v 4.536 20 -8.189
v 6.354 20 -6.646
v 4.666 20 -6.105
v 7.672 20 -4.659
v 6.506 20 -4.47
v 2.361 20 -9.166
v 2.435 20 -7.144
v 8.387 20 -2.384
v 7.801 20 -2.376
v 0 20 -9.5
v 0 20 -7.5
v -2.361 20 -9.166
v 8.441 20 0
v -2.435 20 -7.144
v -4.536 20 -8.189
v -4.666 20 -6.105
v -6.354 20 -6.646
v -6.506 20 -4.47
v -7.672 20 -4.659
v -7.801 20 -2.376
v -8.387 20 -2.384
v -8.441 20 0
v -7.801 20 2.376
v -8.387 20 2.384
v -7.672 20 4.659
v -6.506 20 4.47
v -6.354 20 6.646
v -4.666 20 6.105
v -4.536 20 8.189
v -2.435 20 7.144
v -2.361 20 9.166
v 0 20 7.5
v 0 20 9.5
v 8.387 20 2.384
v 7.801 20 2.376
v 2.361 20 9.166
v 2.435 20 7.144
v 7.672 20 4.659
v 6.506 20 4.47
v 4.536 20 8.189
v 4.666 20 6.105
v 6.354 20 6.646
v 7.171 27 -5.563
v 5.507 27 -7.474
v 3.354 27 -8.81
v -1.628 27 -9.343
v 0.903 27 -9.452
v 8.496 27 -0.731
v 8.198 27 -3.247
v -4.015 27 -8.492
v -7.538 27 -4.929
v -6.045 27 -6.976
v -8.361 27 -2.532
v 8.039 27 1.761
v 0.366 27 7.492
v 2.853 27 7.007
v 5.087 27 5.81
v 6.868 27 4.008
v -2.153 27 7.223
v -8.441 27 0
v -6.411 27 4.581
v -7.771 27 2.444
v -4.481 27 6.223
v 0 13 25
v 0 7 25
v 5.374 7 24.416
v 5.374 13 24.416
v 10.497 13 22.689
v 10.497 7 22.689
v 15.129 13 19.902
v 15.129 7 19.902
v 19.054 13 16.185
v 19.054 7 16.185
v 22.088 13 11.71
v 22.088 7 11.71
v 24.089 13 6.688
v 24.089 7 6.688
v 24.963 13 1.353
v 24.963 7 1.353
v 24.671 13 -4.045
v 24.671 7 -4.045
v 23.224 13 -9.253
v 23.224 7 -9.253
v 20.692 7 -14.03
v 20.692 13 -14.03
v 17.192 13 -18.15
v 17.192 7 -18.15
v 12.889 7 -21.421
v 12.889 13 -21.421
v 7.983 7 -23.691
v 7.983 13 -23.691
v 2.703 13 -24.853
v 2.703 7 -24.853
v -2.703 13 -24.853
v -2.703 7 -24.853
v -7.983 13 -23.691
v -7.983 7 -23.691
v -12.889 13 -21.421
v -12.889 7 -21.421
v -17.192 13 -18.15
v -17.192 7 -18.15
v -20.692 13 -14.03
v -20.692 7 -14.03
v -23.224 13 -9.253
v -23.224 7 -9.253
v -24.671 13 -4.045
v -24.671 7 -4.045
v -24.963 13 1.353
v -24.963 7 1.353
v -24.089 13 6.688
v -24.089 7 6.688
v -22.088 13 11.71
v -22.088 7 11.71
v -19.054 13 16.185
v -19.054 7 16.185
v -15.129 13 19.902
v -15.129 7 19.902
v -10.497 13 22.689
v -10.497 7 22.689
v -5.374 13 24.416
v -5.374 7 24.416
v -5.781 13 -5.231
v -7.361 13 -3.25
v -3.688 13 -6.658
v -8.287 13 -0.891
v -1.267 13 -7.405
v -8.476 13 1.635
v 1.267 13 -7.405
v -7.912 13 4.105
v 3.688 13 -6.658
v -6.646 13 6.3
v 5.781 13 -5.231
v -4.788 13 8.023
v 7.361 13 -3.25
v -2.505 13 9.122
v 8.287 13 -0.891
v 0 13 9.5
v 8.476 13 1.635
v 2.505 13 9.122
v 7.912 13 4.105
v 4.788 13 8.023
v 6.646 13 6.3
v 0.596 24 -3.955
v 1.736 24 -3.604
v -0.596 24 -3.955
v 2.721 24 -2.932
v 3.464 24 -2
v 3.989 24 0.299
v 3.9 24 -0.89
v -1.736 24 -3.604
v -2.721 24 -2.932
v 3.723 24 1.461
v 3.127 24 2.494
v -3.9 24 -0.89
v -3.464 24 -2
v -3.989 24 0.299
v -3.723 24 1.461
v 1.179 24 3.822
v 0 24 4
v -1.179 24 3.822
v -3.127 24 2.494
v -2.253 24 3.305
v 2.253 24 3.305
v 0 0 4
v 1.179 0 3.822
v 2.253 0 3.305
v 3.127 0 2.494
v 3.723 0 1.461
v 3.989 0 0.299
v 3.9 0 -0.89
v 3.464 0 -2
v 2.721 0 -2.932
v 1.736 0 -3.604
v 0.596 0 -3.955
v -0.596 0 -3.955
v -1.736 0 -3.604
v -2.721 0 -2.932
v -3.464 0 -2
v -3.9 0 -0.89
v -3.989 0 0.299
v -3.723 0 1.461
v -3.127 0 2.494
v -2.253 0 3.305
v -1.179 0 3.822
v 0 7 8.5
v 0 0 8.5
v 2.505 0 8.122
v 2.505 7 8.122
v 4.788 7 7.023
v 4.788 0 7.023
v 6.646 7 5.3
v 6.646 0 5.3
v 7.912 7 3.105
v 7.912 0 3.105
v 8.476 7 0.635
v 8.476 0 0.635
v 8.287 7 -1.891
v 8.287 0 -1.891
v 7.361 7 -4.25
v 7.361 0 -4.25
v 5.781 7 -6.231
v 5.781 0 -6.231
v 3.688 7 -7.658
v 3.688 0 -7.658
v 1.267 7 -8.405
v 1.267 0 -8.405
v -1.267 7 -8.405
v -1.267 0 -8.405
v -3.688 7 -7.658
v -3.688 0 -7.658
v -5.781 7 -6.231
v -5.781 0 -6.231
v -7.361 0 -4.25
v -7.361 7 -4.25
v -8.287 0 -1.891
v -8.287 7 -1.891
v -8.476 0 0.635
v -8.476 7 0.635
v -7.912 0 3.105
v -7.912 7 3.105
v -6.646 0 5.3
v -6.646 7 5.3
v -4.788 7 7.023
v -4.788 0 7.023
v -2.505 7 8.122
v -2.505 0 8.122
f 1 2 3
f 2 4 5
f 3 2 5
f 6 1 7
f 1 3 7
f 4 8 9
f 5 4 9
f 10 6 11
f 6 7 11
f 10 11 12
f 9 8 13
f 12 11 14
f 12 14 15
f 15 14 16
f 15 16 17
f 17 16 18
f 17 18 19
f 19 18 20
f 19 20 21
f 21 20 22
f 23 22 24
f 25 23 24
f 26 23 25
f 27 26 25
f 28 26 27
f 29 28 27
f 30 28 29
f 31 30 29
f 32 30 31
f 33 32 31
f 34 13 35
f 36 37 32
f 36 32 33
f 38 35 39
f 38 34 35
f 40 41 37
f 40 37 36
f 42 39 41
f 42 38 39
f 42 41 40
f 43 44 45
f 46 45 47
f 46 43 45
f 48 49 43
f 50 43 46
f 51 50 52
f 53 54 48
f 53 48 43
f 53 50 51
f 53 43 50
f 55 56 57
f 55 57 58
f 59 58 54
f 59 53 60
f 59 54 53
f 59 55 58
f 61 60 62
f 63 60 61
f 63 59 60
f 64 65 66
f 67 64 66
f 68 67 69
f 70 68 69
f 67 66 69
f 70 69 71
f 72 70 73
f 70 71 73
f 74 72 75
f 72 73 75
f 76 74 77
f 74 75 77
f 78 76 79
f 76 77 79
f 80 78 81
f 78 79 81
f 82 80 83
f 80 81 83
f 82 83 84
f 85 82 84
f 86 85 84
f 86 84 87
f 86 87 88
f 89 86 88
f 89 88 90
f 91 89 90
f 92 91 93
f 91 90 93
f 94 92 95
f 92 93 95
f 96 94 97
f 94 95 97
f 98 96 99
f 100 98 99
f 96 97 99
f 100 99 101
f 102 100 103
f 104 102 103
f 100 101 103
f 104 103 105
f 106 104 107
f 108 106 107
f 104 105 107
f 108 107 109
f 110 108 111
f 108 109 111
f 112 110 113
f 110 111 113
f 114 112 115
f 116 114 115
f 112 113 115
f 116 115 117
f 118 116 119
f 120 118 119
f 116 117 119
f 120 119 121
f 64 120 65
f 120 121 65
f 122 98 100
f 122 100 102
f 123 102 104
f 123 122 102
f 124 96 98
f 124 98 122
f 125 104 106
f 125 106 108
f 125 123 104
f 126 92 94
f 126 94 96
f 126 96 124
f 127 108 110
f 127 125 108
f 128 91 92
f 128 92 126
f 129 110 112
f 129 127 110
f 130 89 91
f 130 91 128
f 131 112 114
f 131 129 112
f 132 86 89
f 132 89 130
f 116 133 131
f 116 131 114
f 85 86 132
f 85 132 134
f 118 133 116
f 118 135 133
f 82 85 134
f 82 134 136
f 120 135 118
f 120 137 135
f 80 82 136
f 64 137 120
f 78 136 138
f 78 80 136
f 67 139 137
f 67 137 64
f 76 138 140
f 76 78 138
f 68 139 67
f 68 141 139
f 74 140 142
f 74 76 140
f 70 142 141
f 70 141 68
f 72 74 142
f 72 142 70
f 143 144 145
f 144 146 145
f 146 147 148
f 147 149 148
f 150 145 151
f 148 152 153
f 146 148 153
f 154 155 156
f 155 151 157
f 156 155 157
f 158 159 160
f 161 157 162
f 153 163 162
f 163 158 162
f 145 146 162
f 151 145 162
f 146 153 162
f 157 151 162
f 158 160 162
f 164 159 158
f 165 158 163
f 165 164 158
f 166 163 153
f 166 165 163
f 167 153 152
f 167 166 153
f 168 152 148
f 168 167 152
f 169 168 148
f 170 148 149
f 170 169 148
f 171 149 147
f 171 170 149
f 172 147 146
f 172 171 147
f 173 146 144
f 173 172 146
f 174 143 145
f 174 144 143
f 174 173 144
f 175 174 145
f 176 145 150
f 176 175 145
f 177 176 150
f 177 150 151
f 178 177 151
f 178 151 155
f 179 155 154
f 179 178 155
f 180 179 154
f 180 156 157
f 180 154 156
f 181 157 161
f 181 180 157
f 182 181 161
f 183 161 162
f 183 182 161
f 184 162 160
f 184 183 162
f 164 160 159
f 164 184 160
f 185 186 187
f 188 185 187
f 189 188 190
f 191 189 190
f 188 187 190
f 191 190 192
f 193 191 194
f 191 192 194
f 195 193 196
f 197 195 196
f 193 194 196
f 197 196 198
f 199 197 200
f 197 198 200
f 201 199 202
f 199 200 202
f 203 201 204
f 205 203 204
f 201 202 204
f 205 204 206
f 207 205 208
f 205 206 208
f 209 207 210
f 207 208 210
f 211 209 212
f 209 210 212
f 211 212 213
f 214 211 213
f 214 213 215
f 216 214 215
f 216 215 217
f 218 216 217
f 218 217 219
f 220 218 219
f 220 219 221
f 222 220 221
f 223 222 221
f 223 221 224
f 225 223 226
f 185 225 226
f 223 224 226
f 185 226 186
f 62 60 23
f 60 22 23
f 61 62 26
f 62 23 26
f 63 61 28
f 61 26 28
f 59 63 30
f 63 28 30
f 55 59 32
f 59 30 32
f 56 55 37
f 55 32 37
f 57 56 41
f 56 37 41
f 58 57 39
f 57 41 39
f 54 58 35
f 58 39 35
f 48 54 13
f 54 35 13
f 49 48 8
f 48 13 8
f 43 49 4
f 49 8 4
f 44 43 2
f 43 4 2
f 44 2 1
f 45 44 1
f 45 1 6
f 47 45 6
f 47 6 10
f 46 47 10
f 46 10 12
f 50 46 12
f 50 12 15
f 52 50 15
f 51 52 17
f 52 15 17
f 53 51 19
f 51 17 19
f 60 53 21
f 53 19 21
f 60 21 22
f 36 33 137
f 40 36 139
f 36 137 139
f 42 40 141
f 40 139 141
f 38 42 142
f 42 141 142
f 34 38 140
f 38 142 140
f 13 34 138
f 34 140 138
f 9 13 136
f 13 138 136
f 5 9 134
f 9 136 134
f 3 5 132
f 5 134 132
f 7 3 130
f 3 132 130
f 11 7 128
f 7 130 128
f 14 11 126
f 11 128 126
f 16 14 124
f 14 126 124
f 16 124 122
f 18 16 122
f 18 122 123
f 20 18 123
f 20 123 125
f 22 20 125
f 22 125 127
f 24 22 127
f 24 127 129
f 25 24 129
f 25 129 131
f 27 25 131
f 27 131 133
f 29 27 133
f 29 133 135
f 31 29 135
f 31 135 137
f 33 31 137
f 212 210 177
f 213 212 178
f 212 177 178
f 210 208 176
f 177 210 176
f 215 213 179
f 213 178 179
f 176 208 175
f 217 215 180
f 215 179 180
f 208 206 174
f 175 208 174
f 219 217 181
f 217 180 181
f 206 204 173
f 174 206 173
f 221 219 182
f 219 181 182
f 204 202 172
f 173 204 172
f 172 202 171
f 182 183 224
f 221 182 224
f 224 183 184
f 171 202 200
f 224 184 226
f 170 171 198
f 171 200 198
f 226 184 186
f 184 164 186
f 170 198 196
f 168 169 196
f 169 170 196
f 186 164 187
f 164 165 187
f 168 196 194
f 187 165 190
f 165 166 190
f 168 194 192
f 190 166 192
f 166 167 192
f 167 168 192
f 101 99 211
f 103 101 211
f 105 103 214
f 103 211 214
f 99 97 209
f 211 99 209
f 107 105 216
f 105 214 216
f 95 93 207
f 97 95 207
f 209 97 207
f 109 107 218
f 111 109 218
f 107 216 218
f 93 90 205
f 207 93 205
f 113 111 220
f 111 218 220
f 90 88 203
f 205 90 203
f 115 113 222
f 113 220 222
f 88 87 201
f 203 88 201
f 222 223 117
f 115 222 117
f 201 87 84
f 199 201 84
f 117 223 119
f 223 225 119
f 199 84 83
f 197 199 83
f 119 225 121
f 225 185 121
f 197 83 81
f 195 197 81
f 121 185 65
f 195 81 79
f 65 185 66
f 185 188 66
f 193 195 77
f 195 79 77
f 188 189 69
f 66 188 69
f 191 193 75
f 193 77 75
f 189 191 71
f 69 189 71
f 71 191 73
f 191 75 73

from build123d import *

# Parameters (mm, degrees)
SKETCH1_R           = 8.5
SKETCH1_R_2         = 4
BOSS_EXTRUDE1_DEPTH = 7
SKETCH3_R           = 25
SKETCH3_R_2         = 4
BOSS_EXTRUDE3_DEPTH = 6
SKETCH4_R           = 8.5
SKETCH4_R_2         = 4
BOSS_EXTRUDE4_DEPTH = 7
SKETCH5_R           = 8.5
SKETCH5_R_2         = 4
BOSS_EXTRUDE5_DEPTH = 7
BOSS_EXTRUDE6_START = -3
SKETCH6_R           = 8.5
BOSS_EXTRUDE6_DEPTH = 3


with BuildPart() as part:
    # Sketch1 → Boss-Extrude1 (new body)
    with BuildSketch(Plane(origin=(0, 0, 0), x_dir=(1, 0, 0), z_dir=(0, 1, 0))):
        with Locations(Location((0, 0, 0), (0, 0, 270))):
            Circle(SKETCH1_R)
        with Locations(Location((0, 0, 0), (0, 0, 270))):
            Circle(SKETCH1_R_2, mode=Mode.SUBTRACT)
    extrude(amount=BOSS_EXTRUDE1_DEPTH)

    # Sketch3 → Boss-Extrude3 (add)
    with BuildSketch(Plane(origin=(0, 7, 0), x_dir=(1, 0, 0), z_dir=(0, 1, 0))):
        with Locations(Location((0, 0, 0), (0, 0, 270))):
            Circle(SKETCH3_R)
        with Locations(Location((0, 0, 0), (0, 0, 270))):
            Circle(SKETCH3_R_2, mode=Mode.SUBTRACT)
    extrude(amount=BOSS_EXTRUDE3_DEPTH)

    # Sketch4 → Boss-Extrude4 (add)
    with BuildSketch(Plane(origin=(0, 13, 0), x_dir=(1, 0, 0), z_dir=(0, 1, 0))):
        with Locations(Location((0, -1, 0), (0, 0, 270))):
            Circle(SKETCH4_R)
        with Locations(Location((0, 0, 0), (0, 0, 270))):
            Circle(SKETCH4_R_2, mode=Mode.SUBTRACT)
    extrude(amount=BOSS_EXTRUDE4_DEPTH)

    # Sketch5 → Boss-Extrude5 (add)
    with BuildSketch(Plane(origin=(0, 20, 0), x_dir=(1, 0, 0), z_dir=(0, 1, 0))):
        with Locations(Location((0, 1, 0), (0, 0, 186.756327031))):
            Circle(SKETCH5_R)
        with Locations(Location((0, 0, 0), (0, 0, 270))):
            Circle(SKETCH5_R_2, mode=Mode.SUBTRACT)
    extrude(amount=BOSS_EXTRUDE5_DEPTH)

    # Sketch6 → Boss-Extrude6 (add)
    with BuildSketch(Plane(origin=(0, 27, 0), x_dir=(1, 0, 0), z_dir=(0, 1, 0)).offset(BOSS_EXTRUDE6_START)):
        with Locations(Location((0, 1, 0), (0, 0, 186.756327031))):
            Circle(SKETCH6_R)
    extrude(amount=BOSS_EXTRUDE6_DEPTH)


solid = part.part
